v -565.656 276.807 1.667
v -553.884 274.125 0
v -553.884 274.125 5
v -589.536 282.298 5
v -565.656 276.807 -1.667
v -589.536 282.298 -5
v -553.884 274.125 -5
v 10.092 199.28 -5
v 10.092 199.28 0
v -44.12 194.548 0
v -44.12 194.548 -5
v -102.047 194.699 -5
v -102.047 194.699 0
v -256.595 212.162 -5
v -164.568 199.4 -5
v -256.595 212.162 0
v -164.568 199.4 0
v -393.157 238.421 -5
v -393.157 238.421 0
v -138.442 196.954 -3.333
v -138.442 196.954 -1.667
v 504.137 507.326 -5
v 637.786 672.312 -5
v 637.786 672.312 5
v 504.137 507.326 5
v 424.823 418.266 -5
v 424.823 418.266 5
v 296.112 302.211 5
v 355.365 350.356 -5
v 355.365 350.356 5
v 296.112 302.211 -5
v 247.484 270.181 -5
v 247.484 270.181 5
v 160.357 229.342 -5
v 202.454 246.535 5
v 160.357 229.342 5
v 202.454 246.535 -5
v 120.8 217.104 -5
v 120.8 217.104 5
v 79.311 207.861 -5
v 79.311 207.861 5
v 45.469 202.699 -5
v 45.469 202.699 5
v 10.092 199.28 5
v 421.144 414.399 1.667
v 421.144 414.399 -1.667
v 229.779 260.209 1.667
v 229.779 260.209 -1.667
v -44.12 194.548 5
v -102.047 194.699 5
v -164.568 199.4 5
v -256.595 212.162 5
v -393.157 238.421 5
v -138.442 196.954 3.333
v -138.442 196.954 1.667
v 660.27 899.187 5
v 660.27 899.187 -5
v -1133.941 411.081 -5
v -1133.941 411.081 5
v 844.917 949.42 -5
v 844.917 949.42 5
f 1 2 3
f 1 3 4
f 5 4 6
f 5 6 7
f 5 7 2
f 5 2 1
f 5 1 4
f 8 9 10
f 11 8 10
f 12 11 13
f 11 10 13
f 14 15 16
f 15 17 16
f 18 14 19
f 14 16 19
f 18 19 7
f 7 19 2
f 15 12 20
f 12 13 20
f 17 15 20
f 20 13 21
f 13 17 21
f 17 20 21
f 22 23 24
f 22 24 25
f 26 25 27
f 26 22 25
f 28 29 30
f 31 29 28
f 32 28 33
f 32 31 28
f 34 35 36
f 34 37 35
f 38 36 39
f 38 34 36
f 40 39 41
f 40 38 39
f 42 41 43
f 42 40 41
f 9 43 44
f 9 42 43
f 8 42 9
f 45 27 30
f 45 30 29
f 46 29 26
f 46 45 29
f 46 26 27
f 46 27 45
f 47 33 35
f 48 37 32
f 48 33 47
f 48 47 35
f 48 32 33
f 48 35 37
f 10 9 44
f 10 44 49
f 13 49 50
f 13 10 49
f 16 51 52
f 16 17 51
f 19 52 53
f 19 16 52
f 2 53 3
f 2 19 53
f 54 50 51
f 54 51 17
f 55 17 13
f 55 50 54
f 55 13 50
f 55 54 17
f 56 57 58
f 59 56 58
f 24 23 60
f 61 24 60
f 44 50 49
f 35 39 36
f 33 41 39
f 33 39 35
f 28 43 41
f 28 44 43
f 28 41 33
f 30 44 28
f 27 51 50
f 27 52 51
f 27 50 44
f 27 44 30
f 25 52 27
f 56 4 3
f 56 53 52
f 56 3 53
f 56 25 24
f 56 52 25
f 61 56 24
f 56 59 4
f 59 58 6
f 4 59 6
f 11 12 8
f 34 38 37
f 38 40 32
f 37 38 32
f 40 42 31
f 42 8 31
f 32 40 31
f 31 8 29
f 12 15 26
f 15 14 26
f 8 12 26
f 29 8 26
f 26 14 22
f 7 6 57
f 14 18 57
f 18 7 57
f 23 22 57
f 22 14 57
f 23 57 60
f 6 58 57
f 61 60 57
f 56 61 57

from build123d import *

# Parameters (mm, degrees)
EXTRUDE_1_DEPTH          = 5
CUT_EXTRUDE_1_DEPTH      = 1202.322110811
CUT_EXTRUDE_1_DEPTH_BACK = 1202.322110811
EXTRUDE_2_DEPTH          = 10


with BuildPart() as part:
    # Эскиз11 → Бобышка-Вытянуть1 (new, symmetric)
    with BuildSketch(Plane.XY):
        with BuildLine():
            Line((636.463912705, 976.146466683), (700.205604925, 770.085305884))
            add(Edge.make_bspline(
                [(700.205604925, 770.085305884), (141.848194954, 128.23481722), (116.561380271, 120.122243094), (-589.536273057, 282.297875154)],
                knots=[0, 0, 0, 0, 1, 1, 1, 1], degree=3))
            Line((-589.536273057, 282.297875154), (-589.536273057, 976.146466683))
            Line((-589.536273057, 976.146466683), (636.463912705, 976.146466683))
        make_face()
    extrude(amount=EXTRUDE_1_DEPTH, both=True)

    # Эскиз12 → Вырез-Вытянуть1 (cut, two sides: drawn at the far end of the back side and taken through both)
    with BuildSketch(Plane.XY.offset(-CUT_EXTRUDE_1_DEPTH_BACK)):
        Polygon((-700.700191259, 528.942112061), (706.16734826, 911.673616779), (340.903623972, 1222.525422138), (-820.682545159, 1079.972181823), align=None)
    extrude(amount=CUT_EXTRUDE_1_DEPTH + CUT_EXTRUDE_1_DEPTH_BACK, mode=Mode.SUBTRACT)


with BuildPart() as cut_extrude_1_piece_1:
    # of the separate pieces the step leaves, piece 1, a body of its own (cut_extrude_1_pieces)
    add(part.part.solids().sort_by_distance((660.269941789, 899.187449498, 5))[0])

    # Эскиз14 → Бобышка-Вытянуть2 (add)
    with BuildSketch(Plane(origin=(0, 0, -5), x_dir=(-1, 0, 0), z_dir=(0, 0, -1))):
        with BuildLine():
            Line((1133.941311309, 411.08096229), (589.536273057, 282.297875154))
            add(Edge.make_bspline(
                [(-637.785646163, 672.312444588), (-248.934023891, 179.435642483), (-152.966629698, 110.557627429), (589.536273057, 282.297875154)],
                knots=[0, 0, 0, 0, 1, 1, 1, 1], degree=3))
            Line((-637.785646163, 672.312444588), (-844.917078579, 949.419809347))
            Line((-844.917078579, 949.419809347), (-660.269941789, 899.187449498))
            Line((-660.269941789, 899.187449498), (1133.941311309, 411.08096229))
        make_face()
    extrude(amount=-EXTRUDE_2_DEPTH)


with BuildPart() as cut_extrude_1_piece_2:
    # of the separate pieces the step leaves, piece 2, a body of its own (cut_extrude_1_pieces)
    add(part.part.solids().sort_by_distance((636.463912705, 976.146466683, -5))[0])


solid = cut_extrude_1_piece_1.part
